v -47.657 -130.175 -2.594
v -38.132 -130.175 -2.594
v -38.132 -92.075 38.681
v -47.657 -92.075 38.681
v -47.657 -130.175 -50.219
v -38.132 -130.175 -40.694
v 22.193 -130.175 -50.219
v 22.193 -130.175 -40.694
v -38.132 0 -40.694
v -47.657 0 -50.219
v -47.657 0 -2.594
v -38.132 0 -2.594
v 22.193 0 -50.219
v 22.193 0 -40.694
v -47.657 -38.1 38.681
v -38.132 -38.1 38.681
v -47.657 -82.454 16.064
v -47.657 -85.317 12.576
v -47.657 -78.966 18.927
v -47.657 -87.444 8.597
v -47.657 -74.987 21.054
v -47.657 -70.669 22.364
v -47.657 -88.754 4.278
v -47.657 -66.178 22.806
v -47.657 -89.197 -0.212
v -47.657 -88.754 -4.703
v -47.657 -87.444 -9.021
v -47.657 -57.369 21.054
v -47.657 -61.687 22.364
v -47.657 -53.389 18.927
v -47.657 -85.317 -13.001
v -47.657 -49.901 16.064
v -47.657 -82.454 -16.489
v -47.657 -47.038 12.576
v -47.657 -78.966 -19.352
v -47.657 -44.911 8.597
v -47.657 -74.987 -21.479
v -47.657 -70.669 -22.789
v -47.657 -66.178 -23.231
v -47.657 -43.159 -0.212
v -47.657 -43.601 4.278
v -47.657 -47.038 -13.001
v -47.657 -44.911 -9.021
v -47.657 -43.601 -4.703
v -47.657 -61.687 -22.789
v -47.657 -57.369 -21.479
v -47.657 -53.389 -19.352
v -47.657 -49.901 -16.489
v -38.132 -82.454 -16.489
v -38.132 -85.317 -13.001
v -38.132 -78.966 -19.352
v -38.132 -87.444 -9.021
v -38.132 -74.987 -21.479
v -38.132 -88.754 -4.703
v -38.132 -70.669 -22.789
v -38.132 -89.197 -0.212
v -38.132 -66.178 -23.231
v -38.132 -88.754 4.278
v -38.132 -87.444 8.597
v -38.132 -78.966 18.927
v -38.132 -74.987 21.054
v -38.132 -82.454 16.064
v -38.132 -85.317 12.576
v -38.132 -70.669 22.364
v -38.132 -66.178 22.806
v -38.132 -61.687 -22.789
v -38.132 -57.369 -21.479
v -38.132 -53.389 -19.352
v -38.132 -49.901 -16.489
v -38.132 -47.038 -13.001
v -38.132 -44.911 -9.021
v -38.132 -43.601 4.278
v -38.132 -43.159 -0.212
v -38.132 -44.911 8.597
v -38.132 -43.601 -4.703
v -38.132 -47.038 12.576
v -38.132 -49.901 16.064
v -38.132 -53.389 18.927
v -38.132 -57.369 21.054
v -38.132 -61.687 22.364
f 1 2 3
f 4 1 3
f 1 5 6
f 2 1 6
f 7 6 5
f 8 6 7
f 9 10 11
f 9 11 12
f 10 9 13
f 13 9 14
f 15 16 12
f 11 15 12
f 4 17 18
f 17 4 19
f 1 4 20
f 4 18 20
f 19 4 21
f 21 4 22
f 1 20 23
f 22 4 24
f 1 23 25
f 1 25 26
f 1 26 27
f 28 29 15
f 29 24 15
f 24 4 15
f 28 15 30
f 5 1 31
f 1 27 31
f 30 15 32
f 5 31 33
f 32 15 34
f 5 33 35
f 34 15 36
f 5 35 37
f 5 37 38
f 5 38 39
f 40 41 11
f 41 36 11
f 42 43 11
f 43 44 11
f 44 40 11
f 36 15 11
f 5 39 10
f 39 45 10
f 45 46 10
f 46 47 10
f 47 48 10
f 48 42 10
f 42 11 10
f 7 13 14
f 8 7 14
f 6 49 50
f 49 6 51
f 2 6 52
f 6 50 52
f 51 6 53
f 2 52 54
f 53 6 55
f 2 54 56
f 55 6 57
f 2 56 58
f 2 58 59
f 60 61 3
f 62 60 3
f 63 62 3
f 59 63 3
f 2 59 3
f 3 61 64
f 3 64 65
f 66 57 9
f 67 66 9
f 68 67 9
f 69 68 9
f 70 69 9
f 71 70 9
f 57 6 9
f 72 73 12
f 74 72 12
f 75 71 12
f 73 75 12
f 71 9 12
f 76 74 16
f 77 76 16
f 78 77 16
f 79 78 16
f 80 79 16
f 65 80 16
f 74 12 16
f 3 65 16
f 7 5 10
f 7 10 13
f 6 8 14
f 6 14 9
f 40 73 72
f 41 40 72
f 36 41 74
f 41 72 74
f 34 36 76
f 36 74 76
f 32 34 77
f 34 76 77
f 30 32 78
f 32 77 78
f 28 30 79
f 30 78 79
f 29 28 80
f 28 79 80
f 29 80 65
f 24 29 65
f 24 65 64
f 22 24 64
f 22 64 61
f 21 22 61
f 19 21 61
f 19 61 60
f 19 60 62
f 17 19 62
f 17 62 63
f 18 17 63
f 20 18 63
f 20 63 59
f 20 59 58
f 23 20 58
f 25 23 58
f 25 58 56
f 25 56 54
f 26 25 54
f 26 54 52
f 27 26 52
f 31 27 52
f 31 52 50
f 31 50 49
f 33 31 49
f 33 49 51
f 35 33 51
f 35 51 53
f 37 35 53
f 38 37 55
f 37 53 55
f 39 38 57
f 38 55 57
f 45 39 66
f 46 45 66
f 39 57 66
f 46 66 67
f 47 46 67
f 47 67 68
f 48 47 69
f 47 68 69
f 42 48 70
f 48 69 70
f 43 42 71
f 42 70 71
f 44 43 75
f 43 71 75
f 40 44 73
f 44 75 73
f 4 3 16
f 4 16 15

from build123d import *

# Parameters (mm, degrees)
F1_DEPTH = 130.175
F2_R     = 23.01875
F3_DEPTH = 25.4


with BuildPart() as f1:
    # F0 (on Front) → F1 (new body)
    with BuildSketch(Plane.XZ):
        Polygon((-38.131632, 38.681432), (-47.656632, 38.681432), (-47.656632, -50.218568), (22.193368, -50.218568), (22.193368, -40.693568), (-38.131632, -40.693568), align=None)
    extrude(amount=F1_DEPTH)

    # F2 (on face) → F3 (cut)
    with BuildSketch(Plane.YZ.offset(-38.131632)):
        Polygon((-130.175, -2.593568), (-92.075, 38.681432), (-130.175, 38.681432), align=None)
        Polygon((-38.1, 38.681432), (0, -2.593568), (0, 0), (0, 38.681432), align=None)
        with Locations((-66.177778, -0.212318)):
            Circle(F2_R)
    extrude(amount=-F3_DEPTH, mode=Mode.SUBTRACT)


solid = f1.part
